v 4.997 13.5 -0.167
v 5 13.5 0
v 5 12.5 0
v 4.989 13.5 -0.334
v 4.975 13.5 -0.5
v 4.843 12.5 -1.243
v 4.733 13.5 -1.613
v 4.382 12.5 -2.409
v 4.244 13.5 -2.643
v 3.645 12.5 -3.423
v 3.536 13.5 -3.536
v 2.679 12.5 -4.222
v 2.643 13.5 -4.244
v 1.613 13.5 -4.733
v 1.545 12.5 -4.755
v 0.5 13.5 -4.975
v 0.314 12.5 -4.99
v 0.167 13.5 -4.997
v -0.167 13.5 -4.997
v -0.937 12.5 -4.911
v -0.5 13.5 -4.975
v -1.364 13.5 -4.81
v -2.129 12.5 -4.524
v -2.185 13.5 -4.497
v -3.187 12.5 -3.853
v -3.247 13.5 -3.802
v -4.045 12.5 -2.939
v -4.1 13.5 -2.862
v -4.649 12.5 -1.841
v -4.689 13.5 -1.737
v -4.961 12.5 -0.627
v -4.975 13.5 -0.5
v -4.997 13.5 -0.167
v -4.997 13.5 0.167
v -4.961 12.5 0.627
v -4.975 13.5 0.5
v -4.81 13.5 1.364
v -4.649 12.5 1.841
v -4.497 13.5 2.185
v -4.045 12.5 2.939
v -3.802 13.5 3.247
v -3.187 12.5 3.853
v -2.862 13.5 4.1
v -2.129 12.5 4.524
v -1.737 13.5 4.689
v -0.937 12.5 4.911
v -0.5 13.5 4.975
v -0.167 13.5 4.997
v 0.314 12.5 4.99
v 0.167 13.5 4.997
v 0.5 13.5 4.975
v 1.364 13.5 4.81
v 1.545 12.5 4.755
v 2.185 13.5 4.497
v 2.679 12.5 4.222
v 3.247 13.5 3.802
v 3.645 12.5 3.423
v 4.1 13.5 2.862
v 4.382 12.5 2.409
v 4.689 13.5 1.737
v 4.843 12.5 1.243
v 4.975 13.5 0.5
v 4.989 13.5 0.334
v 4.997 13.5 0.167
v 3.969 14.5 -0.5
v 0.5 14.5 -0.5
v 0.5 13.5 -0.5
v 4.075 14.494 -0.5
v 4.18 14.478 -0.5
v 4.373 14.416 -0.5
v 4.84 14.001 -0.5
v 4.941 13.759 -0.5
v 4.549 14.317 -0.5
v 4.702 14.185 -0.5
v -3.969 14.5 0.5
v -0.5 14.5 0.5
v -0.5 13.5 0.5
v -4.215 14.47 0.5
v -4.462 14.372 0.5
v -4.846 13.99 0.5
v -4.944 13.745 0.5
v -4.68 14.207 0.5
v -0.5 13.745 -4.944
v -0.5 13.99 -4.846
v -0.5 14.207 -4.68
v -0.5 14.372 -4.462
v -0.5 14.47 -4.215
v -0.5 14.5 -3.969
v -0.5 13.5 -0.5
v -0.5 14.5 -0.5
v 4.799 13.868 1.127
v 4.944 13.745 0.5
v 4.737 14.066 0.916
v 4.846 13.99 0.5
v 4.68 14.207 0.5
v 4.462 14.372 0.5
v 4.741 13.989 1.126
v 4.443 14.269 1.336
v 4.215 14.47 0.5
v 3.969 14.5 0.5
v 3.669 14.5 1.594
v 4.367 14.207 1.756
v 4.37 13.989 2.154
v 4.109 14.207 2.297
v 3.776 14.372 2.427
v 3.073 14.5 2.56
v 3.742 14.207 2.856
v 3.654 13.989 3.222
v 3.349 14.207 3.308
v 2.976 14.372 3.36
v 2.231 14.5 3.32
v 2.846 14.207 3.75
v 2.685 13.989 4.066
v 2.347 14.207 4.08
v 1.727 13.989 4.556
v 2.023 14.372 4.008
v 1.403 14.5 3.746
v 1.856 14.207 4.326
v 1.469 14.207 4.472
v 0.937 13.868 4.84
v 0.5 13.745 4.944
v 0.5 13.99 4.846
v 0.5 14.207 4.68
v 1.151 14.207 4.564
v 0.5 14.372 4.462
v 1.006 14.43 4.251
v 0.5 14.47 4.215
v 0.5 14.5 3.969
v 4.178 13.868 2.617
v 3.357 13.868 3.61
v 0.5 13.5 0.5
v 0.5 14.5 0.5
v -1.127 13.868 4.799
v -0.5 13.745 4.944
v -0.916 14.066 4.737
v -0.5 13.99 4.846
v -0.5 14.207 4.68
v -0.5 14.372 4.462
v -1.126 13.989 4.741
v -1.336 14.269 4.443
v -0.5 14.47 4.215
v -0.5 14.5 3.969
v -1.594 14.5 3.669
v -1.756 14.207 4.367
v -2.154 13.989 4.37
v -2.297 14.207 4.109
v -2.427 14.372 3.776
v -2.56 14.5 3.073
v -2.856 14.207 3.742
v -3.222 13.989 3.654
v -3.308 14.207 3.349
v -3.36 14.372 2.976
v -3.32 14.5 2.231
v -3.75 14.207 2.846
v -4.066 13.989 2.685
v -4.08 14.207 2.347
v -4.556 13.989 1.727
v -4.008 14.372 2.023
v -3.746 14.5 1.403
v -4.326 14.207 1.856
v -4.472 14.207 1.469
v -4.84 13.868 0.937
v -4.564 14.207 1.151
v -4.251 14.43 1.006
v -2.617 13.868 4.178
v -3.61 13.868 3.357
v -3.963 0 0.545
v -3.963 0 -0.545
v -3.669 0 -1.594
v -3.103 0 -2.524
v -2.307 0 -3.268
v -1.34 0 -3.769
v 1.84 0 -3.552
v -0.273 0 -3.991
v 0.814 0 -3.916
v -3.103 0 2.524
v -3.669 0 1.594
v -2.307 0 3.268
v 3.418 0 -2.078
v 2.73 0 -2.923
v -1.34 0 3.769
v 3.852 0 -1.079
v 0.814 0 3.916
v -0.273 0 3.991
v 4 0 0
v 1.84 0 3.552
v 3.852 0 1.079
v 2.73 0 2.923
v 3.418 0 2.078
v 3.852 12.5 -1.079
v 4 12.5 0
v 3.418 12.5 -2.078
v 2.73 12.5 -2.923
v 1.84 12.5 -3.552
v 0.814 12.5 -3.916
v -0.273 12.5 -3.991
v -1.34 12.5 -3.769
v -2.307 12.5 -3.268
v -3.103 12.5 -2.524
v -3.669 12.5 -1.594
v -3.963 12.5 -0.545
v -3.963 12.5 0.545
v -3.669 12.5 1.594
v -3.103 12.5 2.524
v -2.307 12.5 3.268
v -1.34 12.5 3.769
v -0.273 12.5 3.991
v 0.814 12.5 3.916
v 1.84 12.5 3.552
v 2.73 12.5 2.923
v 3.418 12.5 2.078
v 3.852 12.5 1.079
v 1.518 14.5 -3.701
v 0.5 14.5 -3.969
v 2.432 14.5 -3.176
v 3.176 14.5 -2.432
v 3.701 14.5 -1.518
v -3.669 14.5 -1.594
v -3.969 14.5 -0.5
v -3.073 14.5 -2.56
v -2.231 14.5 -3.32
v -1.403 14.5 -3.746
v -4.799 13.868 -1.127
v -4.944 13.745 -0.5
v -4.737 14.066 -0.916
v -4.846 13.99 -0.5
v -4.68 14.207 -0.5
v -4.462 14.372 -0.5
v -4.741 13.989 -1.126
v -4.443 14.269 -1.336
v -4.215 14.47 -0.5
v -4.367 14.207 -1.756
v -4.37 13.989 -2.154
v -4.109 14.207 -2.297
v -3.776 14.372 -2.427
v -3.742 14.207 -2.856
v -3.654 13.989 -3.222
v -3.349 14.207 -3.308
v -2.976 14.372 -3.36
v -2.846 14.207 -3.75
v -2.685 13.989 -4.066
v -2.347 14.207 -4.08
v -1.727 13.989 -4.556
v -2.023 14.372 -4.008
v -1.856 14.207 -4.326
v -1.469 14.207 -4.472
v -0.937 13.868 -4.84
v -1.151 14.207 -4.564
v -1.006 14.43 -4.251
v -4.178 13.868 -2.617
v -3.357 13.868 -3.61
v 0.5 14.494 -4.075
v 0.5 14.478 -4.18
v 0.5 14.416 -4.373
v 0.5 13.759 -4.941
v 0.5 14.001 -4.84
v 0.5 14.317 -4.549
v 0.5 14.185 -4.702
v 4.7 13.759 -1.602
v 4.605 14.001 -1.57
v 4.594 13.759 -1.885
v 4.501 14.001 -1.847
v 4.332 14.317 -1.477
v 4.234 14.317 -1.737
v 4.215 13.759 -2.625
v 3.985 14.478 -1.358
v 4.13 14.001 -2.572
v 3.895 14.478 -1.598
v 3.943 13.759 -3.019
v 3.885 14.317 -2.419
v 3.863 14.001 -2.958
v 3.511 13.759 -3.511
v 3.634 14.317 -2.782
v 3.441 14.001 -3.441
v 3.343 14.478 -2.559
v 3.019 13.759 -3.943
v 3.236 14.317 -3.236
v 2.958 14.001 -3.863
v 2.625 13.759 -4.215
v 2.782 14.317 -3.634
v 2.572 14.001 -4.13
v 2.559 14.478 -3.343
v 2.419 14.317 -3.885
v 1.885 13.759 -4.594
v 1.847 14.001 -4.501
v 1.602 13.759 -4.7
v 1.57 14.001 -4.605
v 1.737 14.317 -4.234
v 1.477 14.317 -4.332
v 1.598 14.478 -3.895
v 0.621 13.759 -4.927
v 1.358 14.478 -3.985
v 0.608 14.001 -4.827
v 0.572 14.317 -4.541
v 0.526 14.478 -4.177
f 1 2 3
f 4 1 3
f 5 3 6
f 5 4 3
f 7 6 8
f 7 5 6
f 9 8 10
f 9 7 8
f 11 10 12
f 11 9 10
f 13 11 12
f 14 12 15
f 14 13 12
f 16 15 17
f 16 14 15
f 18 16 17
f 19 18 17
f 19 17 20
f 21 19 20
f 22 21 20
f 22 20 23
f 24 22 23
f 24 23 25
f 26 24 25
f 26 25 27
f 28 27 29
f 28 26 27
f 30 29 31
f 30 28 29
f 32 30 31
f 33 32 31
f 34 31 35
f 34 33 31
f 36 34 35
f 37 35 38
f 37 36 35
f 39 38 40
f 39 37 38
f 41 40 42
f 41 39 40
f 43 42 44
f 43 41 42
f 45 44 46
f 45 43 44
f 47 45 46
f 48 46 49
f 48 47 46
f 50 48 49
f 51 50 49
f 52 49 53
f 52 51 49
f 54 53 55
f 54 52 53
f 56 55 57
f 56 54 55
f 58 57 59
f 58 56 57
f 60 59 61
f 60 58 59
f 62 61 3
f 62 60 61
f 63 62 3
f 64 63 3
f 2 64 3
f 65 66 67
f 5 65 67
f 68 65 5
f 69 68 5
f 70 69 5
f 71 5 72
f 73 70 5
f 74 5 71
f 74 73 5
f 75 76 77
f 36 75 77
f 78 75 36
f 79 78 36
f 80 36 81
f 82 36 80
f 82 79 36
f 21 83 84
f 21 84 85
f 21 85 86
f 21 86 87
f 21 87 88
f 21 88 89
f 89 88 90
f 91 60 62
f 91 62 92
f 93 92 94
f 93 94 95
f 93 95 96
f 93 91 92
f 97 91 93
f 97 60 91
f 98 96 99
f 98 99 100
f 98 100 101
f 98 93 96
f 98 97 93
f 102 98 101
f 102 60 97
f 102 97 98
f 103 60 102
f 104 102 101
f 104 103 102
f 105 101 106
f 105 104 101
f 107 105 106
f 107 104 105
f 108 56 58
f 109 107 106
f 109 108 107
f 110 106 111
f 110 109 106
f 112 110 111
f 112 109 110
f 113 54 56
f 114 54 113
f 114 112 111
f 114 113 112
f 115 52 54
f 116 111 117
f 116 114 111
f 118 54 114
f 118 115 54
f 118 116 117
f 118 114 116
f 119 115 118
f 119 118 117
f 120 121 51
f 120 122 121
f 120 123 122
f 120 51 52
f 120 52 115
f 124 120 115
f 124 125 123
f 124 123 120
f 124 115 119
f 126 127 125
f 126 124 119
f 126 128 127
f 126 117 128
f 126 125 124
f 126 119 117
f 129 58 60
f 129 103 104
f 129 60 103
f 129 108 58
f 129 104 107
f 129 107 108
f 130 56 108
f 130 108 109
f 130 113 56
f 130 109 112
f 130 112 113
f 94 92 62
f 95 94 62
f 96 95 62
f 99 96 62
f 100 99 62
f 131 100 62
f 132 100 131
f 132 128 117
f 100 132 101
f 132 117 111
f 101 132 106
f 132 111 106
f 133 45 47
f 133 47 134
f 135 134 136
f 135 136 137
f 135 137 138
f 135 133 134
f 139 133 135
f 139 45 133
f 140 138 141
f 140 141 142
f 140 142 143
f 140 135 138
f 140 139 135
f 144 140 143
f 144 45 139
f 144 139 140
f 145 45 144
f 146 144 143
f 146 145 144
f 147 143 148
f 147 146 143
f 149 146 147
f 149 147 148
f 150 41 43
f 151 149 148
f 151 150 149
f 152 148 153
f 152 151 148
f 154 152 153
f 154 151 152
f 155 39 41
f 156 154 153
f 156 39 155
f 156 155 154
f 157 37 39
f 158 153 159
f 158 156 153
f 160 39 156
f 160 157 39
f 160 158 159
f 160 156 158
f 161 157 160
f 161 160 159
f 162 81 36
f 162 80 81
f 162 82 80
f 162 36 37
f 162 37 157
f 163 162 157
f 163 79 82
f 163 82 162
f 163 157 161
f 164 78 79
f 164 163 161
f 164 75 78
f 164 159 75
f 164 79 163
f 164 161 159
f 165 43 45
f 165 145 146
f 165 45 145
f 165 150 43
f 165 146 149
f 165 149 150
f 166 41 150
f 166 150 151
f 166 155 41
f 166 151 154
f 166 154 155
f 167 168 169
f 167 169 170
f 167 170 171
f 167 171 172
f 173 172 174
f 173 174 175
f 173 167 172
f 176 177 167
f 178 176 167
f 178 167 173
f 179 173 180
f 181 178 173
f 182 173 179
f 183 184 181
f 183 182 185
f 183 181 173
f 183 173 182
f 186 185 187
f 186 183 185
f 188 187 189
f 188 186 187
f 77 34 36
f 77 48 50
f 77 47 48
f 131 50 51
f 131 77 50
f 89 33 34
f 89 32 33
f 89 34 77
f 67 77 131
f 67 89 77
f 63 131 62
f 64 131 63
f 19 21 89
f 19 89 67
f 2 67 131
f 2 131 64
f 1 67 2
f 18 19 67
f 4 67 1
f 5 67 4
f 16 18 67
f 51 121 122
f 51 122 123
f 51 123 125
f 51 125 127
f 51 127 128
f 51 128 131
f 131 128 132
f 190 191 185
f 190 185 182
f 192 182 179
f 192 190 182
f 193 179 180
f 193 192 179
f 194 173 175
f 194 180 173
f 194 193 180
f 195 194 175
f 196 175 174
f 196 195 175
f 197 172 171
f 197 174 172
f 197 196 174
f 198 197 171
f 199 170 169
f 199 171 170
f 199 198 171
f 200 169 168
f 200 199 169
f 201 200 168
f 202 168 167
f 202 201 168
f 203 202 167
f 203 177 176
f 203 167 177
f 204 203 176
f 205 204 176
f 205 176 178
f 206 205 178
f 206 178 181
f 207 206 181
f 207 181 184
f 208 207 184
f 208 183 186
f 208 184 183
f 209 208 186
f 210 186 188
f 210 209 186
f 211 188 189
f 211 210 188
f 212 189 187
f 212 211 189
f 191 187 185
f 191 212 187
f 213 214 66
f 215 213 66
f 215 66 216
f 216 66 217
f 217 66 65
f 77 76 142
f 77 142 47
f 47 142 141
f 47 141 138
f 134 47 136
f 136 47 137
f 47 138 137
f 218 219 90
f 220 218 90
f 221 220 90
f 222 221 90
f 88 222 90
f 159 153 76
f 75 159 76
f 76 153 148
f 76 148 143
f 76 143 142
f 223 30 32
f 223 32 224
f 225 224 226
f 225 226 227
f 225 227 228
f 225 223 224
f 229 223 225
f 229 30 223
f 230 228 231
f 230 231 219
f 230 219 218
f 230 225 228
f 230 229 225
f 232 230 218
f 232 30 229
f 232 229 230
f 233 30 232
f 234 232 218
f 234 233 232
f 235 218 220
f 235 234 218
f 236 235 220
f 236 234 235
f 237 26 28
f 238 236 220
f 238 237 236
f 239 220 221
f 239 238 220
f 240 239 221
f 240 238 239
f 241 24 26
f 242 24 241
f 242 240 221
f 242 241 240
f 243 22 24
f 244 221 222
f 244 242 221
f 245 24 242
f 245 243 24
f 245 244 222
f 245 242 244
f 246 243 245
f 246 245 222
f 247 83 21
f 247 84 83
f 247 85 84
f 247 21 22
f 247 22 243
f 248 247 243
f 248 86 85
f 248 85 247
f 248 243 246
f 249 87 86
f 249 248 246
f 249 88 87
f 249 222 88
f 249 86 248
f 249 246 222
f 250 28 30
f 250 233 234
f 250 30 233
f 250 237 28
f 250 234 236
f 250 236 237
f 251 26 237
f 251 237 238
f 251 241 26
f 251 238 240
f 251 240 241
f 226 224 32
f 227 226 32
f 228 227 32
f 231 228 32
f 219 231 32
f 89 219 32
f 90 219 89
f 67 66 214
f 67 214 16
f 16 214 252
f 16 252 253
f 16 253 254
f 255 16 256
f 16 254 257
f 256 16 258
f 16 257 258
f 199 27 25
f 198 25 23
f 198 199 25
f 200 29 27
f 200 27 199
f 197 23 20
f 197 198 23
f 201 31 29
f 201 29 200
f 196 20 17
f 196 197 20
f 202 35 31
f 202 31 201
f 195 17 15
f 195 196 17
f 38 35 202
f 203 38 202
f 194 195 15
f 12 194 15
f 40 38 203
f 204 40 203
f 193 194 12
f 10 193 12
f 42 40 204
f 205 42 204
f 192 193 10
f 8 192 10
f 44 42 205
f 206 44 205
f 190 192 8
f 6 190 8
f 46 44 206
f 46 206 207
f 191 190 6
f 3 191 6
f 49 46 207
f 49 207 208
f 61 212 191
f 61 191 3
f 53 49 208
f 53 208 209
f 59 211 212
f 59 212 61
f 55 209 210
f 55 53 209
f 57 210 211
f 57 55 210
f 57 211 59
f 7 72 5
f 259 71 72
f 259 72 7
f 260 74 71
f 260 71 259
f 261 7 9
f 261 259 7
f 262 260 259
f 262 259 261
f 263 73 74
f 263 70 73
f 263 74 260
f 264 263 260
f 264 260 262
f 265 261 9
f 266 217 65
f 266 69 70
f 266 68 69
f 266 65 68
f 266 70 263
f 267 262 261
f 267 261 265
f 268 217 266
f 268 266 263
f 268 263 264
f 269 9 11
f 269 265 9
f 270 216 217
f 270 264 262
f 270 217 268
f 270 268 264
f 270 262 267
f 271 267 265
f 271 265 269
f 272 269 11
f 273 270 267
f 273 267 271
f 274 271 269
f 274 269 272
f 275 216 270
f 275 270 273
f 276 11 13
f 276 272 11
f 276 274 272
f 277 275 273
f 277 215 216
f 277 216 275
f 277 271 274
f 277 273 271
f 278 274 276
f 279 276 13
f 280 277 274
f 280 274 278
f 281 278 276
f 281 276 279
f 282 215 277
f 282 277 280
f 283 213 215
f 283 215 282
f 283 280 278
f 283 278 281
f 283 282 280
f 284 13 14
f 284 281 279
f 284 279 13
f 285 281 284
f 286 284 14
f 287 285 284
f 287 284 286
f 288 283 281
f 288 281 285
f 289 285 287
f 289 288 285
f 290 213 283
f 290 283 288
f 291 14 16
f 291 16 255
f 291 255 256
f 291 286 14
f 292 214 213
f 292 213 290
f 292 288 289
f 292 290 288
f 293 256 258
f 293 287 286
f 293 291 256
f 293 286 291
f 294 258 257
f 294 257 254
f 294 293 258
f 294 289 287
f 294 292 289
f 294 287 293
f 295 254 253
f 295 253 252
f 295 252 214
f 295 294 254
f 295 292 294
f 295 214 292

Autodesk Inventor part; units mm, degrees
ref_plane "YZ Plane" through (0, 0, 0) normal (1, 0, 0) x (0, 1, 0)
ref_plane "XZ Plane" through (0, 0, 0) normal (0, 1, 0) x (-1, 0, 0)
ref_plane "XY Plane" through (0, 0, 0) normal (0, 0, 1) x (1, 0, 0)
sketch "Boceto1" plane through (0, 0, 0) normal (0, 0, 1) x (1, 0, 0)
  line L0 (0, 0) -> (4, 0)
  line L1 (4, 0) -> (4, 12.5)
  line L2 (4, 12.5) -> (0, 12.5)
  line L3 (0, 12.5) -> (0, 0)
  line L4 (0, 12.5) -> (5, 12.5)
  line L5 (5, 12.5) -> (5, 14.5)
  line L6 (5, 14.5) -> (0, 14.5)
  line L7 (0, 14.5) -> (0, 12.5)
  point P0 (4, 12.5)
  dimension "d0" = 4
  dimension "d1" = 12.5
  dimension "d2" = 5
  dimension "d3" = 2
revolve "Revolución1" add sketch "Boceto1" angle 360 about axis through (0, 12.5, 0) along (0, -1, 0)
thread "Rosca1" size "M8x1.25" class "6g" standard "ANSI Metric M Profile" full length
sketch "Boceto2" plane through (0, 14.5, 0) normal (0, 1, 0) x (1, 0, 0)
  line L0 (-0.5, -5) -> (0.5, -5)
  line L1 (0.5, -5) -> (0.5, 5)
  line L2 (0.5, 5) -> (-0.5, 5)
  line L3 (-0.5, 5) -> (-0.5, -5)
  line L4 (5, -0.5) -> (-5, -0.5)
  line L5 (-5, -0.5) -> (-5, 0.5)
  line L6 (-5, 0.5) -> (5, 0.5)
  line L7 (5, 0.5) -> (5, -0.5)
  point P0 (0, 0)
  point P1 (0.5, 0.5)
  point P2 (0.5, -0.5)
  point P3 (-0.5, -0.5)
  point P4 (-0.5, 0.5)
  dimension "d7" = 1
  dimension "d8" = 1
  dimension "d9" = 10
  dimension "d10" = 10
  dimension "d11" = 0.5
  dimension "d12" = 0.5
  dimension "d13" = 5
  dimension "d14" = 5
extrude "Extrusión1" cut sketch "Boceto2" against normal blind 1
fillet "Empalme1" radius 1 1 edges at (3.5355, 14.5, -3.5355)
fillet "Empalme2" radius 1 3 edges at (-3.5355, 14.5, -3.5355) (-3.5355, 14.5, 3.5355) (3.5355, 14.5, 3.5355)
equation "\"d8\" = d7"
equation "\"d10\" = d9"
equation "\"d11\" = 0.5 * d7"
equation "\"d12\" = 0.5 * d7"
equation "\"d13\" = 0.5 * d9"
equation "\"d14\" = 0.5 * d9"
properties part number "Tornillo" material "Acero inoxidable"
